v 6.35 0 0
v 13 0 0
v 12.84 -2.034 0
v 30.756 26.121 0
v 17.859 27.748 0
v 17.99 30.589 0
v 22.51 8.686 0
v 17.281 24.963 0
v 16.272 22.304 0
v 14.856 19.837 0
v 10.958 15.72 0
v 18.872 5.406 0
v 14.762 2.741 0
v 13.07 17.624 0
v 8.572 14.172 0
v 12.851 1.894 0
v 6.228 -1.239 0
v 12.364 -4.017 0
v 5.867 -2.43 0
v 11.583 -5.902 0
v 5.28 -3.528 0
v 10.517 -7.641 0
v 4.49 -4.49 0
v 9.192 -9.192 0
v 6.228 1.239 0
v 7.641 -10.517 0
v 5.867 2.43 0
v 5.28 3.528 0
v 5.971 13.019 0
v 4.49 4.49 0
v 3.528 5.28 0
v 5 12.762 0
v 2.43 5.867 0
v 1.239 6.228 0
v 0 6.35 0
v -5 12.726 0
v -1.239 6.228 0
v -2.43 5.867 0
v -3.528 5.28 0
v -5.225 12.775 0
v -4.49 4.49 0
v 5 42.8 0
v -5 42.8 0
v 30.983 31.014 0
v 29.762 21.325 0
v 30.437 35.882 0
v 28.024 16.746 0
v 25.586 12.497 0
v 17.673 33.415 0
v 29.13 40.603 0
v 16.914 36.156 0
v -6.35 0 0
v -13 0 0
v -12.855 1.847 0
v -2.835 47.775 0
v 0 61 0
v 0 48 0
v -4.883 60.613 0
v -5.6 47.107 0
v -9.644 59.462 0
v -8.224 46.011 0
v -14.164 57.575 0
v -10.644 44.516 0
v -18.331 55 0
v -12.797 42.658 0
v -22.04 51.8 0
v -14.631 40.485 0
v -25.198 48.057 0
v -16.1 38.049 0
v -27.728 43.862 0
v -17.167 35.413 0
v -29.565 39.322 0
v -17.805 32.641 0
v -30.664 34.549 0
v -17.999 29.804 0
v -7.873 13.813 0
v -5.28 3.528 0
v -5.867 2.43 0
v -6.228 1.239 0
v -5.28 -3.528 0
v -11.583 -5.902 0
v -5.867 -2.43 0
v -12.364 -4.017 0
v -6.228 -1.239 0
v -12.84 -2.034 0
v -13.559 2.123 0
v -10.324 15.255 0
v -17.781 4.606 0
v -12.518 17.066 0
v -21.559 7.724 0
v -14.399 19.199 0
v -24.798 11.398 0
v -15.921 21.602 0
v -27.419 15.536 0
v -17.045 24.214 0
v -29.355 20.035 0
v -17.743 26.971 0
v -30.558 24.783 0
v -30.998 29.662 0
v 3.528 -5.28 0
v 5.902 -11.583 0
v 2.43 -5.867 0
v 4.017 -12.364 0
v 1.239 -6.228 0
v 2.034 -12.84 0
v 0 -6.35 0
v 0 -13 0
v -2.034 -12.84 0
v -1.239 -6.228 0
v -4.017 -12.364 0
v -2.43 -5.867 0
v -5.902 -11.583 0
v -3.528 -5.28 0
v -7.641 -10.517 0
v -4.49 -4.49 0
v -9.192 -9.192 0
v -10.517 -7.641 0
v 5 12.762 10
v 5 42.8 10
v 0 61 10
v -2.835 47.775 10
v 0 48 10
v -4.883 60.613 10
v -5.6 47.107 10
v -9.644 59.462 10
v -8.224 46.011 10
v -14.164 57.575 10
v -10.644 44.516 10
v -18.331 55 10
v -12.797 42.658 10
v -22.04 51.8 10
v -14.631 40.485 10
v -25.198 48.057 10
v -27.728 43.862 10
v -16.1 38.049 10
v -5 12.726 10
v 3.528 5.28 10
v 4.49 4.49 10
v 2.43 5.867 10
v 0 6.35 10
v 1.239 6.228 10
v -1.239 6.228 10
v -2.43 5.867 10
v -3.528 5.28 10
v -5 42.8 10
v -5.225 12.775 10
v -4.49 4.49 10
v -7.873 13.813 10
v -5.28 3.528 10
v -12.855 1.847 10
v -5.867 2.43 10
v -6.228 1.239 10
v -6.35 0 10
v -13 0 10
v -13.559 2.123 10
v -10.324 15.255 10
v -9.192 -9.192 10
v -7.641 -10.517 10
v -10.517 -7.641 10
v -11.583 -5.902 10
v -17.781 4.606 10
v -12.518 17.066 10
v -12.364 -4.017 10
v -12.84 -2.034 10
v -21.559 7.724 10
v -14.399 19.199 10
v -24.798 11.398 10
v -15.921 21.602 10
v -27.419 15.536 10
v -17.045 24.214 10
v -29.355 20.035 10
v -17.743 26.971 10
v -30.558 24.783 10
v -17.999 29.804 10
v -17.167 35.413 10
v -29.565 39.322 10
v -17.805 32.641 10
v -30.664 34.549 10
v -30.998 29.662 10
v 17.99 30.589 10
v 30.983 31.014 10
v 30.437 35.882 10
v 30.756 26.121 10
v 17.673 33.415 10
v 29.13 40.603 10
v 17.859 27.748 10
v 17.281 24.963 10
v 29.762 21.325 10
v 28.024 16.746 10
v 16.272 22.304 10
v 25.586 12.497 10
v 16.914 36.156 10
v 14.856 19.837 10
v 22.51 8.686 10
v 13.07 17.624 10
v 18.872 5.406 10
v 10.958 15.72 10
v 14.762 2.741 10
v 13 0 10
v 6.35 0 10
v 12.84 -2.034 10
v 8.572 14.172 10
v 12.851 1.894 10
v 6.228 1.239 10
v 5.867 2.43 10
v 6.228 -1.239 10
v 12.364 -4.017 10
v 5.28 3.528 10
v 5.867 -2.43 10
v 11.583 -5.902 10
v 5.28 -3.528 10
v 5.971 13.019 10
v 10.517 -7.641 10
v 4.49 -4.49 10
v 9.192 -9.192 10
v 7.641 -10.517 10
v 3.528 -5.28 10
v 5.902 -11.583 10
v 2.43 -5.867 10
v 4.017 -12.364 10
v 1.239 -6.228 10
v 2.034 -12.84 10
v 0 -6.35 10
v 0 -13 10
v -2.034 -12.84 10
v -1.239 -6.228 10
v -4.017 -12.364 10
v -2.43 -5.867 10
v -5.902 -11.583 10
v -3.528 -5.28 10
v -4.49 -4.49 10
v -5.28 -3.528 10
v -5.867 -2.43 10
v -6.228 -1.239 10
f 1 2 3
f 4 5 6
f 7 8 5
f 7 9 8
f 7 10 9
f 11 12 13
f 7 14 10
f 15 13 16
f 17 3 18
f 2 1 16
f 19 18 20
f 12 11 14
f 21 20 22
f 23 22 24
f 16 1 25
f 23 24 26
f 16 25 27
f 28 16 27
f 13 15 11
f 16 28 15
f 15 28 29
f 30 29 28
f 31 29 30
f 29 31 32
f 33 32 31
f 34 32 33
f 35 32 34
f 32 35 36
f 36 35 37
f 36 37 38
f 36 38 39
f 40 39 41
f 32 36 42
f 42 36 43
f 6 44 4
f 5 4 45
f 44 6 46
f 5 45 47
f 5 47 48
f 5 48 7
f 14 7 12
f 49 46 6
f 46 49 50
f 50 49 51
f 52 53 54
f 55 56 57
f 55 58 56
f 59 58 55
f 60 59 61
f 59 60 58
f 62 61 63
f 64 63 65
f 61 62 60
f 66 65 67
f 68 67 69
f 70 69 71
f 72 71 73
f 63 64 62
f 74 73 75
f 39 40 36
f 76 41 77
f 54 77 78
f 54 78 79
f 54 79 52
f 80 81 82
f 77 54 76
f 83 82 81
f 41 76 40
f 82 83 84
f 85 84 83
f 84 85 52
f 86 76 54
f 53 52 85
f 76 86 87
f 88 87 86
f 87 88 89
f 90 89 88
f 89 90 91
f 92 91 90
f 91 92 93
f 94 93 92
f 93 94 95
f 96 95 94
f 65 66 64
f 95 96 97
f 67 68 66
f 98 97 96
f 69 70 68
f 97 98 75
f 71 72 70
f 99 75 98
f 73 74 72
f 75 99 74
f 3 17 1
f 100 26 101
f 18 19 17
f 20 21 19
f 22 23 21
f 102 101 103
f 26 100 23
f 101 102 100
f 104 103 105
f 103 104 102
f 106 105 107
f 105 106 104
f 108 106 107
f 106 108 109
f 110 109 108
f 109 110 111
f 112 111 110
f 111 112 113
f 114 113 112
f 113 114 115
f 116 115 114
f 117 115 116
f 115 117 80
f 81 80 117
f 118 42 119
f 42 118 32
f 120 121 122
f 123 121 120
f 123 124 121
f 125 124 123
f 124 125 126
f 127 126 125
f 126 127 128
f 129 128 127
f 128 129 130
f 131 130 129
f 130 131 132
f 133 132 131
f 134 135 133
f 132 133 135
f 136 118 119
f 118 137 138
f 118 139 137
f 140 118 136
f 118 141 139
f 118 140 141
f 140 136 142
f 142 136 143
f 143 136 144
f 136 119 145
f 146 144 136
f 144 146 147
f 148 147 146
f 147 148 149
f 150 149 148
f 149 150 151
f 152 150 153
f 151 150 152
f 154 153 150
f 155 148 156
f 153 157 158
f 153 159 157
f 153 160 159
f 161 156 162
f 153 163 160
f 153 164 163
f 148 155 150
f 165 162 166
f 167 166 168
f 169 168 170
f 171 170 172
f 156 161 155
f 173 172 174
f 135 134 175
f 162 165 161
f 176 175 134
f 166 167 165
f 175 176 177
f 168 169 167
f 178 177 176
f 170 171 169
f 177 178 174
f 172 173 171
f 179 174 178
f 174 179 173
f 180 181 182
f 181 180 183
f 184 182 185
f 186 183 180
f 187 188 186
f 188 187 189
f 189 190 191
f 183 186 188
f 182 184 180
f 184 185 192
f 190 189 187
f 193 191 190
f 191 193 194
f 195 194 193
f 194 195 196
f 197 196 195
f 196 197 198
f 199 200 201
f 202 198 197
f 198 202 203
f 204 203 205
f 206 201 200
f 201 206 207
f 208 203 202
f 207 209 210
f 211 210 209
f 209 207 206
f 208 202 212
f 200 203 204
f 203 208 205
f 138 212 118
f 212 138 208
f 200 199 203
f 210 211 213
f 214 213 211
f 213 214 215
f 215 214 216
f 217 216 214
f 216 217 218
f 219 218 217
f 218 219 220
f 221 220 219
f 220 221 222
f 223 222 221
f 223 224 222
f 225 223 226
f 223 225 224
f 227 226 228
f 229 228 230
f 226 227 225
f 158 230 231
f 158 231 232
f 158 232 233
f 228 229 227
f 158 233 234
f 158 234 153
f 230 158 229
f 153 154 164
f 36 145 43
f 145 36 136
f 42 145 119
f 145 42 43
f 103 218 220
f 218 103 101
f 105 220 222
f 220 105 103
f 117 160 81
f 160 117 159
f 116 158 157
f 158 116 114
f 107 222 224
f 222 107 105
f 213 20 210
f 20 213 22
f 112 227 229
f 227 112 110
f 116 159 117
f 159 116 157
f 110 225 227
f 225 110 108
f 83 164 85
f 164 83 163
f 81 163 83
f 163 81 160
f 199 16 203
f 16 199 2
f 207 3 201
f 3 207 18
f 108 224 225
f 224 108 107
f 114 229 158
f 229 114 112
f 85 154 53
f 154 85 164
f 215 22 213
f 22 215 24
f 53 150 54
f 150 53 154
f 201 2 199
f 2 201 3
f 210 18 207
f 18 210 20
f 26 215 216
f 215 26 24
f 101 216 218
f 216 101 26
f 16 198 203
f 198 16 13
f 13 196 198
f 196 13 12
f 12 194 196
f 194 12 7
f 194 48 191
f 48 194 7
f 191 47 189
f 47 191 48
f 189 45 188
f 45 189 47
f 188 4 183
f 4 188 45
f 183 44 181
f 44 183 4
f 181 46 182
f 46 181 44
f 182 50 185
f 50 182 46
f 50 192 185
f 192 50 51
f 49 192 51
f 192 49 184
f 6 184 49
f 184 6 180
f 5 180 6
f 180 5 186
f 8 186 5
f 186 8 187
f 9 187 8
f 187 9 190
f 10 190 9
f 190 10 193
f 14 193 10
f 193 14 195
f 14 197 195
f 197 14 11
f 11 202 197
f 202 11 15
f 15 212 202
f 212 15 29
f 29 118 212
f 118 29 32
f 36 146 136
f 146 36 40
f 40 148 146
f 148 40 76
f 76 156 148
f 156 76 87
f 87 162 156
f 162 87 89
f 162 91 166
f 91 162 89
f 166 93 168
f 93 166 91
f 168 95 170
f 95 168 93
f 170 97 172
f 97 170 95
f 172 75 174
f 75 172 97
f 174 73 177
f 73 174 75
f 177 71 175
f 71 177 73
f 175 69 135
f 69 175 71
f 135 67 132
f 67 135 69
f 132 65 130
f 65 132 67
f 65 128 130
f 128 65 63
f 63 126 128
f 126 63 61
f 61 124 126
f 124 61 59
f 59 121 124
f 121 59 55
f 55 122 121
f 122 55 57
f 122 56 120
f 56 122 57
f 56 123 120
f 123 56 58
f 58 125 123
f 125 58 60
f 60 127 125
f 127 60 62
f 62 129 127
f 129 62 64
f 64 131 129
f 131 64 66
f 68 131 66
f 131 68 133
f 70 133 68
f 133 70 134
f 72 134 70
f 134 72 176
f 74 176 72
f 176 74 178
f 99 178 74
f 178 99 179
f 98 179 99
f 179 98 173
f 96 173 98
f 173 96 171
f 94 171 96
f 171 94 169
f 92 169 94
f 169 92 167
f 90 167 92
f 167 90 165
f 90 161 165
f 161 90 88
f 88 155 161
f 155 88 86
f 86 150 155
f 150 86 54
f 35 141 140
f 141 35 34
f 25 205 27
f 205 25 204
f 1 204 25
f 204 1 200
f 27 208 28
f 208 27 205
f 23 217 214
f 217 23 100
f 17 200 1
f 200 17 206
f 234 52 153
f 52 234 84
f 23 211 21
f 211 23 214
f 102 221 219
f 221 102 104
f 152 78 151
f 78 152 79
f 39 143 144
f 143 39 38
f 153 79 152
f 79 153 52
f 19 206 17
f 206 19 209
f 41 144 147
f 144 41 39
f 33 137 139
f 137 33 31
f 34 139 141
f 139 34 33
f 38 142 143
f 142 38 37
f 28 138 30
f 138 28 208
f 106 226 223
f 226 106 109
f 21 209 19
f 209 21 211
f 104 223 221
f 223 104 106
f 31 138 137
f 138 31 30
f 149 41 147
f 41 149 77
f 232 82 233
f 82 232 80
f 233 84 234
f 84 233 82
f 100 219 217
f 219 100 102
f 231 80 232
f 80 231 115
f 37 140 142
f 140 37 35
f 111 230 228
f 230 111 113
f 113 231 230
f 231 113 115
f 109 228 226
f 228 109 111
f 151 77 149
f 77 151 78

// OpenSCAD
$fn = 32;

// ----------------------------------------------------------------------
// Hook: 60 mm shank into a 18 mm curl, 10 mm thick
// ----------------------------------------------------------------------

// --- parameters (mm) ---
shank_len = 60;           // shank length from the boss centre
shank_w = 10;             // shank width
boss_d = 26;              // boss diameter
bore_d = 12.7;            // boss bore
curl_in = 18;             // curl inner radius
curl_out = 31;            // curl outer radius
curl_sweep = 290;         // curl sweep angle
hook_t = 10;              // hook thickness

shank_profile = [[-5, 42.8], [5, 42.8], [5, 11], [-5, 11]];
boss_profile = [[13, 0], [12.84, 2.034], [12.364, 4.017], [11.583, 5.902], [10.517, 7.641], [9.192, 9.192], [7.641, 10.517], [5.902, 11.583], [4.017, 12.364], [2.034, 12.84], [0, 13], [-2.034, 12.84], [-4.017, 12.364], [-5.902, 11.583], [-7.641, 10.517], [-9.192, 9.192], [-10.517, 7.641], [-11.583, 5.902], [-12.364, 4.017], [-12.84, 2.034], [-13, 0], [-12.84, -2.034], [-12.364, -4.017], [-11.583, -5.902], [-10.517, -7.641], [-9.192, -9.192], [-7.641, -10.517], [-5.902, -11.583], [-4.017, -12.364], [-2.034, -12.84], [0, -13], [2.034, -12.84], [4.017, -12.364], [5.902, -11.583], [7.641, -10.517], [9.192, -9.192], [10.517, -7.641], [11.583, -5.902], [12.364, -4.017], [12.84, -2.034]];
curl_profile = [[0, 61], [-4.883, 60.613], [-9.644, 59.462], [-14.164, 57.575], [-18.331, 55], [-22.04, 51.8], [-25.198, 48.057], [-27.728, 43.862], [-29.565, 39.322], [-30.664, 34.549], [-30.998, 29.662], [-30.558, 24.783], [-29.355, 20.035], [-27.419, 15.536], [-24.798, 11.398], [-21.559, 7.724], [-17.781, 4.606], [-13.559, 2.123], [-8.999, 0.335], [-4.214, -0.712], [0.676, -0.993], [5.55, -0.499], [10.284, 0.756], [14.762, 2.741], [18.872, 5.406], [22.51, 8.686], [25.586, 12.497], [28.024, 16.746], [29.762, 21.325], [30.756, 26.121], [30.983, 31.014], [30.437, 35.882], [29.13, 40.603], [16.914, 36.156], [17.673, 33.415], [17.99, 30.589], [17.859, 27.748], [17.281, 24.963], [16.272, 22.304], [14.856, 19.837], [13.07, 17.624], [10.958, 15.72], [8.572, 14.172], [5.971, 13.019], [3.222, 12.291], [0.393, 12.004], [-2.447, 12.167], [-5.225, 12.775], [-7.873, 13.813], [-10.324, 15.255], [-12.518, 17.066], [-14.399, 19.199], [-15.921, 21.602], [-17.045, 24.214], [-17.743, 26.971], [-17.999, 29.804], [-17.805, 32.641], [-17.167, 35.413], [-16.1, 38.049], [-14.631, 40.485], [-12.797, 42.658], [-10.644, 44.516], [-8.224, 46.011], [-5.6, 47.107], [-2.835, 47.775], [0, 48]];

difference() {
  union() {
    /* three overlapping outlines: shank, boss and the smooth curl */
    linear_extrude(height = hook_t) polygon(shank_profile);
    linear_extrude(height = hook_t) polygon(boss_profile);
    linear_extrude(height = hook_t) polygon(curl_profile);
  }
  translate([0, 0, -2.5]) cylinder(h = hook_t + 5, d = bore_d);
}
